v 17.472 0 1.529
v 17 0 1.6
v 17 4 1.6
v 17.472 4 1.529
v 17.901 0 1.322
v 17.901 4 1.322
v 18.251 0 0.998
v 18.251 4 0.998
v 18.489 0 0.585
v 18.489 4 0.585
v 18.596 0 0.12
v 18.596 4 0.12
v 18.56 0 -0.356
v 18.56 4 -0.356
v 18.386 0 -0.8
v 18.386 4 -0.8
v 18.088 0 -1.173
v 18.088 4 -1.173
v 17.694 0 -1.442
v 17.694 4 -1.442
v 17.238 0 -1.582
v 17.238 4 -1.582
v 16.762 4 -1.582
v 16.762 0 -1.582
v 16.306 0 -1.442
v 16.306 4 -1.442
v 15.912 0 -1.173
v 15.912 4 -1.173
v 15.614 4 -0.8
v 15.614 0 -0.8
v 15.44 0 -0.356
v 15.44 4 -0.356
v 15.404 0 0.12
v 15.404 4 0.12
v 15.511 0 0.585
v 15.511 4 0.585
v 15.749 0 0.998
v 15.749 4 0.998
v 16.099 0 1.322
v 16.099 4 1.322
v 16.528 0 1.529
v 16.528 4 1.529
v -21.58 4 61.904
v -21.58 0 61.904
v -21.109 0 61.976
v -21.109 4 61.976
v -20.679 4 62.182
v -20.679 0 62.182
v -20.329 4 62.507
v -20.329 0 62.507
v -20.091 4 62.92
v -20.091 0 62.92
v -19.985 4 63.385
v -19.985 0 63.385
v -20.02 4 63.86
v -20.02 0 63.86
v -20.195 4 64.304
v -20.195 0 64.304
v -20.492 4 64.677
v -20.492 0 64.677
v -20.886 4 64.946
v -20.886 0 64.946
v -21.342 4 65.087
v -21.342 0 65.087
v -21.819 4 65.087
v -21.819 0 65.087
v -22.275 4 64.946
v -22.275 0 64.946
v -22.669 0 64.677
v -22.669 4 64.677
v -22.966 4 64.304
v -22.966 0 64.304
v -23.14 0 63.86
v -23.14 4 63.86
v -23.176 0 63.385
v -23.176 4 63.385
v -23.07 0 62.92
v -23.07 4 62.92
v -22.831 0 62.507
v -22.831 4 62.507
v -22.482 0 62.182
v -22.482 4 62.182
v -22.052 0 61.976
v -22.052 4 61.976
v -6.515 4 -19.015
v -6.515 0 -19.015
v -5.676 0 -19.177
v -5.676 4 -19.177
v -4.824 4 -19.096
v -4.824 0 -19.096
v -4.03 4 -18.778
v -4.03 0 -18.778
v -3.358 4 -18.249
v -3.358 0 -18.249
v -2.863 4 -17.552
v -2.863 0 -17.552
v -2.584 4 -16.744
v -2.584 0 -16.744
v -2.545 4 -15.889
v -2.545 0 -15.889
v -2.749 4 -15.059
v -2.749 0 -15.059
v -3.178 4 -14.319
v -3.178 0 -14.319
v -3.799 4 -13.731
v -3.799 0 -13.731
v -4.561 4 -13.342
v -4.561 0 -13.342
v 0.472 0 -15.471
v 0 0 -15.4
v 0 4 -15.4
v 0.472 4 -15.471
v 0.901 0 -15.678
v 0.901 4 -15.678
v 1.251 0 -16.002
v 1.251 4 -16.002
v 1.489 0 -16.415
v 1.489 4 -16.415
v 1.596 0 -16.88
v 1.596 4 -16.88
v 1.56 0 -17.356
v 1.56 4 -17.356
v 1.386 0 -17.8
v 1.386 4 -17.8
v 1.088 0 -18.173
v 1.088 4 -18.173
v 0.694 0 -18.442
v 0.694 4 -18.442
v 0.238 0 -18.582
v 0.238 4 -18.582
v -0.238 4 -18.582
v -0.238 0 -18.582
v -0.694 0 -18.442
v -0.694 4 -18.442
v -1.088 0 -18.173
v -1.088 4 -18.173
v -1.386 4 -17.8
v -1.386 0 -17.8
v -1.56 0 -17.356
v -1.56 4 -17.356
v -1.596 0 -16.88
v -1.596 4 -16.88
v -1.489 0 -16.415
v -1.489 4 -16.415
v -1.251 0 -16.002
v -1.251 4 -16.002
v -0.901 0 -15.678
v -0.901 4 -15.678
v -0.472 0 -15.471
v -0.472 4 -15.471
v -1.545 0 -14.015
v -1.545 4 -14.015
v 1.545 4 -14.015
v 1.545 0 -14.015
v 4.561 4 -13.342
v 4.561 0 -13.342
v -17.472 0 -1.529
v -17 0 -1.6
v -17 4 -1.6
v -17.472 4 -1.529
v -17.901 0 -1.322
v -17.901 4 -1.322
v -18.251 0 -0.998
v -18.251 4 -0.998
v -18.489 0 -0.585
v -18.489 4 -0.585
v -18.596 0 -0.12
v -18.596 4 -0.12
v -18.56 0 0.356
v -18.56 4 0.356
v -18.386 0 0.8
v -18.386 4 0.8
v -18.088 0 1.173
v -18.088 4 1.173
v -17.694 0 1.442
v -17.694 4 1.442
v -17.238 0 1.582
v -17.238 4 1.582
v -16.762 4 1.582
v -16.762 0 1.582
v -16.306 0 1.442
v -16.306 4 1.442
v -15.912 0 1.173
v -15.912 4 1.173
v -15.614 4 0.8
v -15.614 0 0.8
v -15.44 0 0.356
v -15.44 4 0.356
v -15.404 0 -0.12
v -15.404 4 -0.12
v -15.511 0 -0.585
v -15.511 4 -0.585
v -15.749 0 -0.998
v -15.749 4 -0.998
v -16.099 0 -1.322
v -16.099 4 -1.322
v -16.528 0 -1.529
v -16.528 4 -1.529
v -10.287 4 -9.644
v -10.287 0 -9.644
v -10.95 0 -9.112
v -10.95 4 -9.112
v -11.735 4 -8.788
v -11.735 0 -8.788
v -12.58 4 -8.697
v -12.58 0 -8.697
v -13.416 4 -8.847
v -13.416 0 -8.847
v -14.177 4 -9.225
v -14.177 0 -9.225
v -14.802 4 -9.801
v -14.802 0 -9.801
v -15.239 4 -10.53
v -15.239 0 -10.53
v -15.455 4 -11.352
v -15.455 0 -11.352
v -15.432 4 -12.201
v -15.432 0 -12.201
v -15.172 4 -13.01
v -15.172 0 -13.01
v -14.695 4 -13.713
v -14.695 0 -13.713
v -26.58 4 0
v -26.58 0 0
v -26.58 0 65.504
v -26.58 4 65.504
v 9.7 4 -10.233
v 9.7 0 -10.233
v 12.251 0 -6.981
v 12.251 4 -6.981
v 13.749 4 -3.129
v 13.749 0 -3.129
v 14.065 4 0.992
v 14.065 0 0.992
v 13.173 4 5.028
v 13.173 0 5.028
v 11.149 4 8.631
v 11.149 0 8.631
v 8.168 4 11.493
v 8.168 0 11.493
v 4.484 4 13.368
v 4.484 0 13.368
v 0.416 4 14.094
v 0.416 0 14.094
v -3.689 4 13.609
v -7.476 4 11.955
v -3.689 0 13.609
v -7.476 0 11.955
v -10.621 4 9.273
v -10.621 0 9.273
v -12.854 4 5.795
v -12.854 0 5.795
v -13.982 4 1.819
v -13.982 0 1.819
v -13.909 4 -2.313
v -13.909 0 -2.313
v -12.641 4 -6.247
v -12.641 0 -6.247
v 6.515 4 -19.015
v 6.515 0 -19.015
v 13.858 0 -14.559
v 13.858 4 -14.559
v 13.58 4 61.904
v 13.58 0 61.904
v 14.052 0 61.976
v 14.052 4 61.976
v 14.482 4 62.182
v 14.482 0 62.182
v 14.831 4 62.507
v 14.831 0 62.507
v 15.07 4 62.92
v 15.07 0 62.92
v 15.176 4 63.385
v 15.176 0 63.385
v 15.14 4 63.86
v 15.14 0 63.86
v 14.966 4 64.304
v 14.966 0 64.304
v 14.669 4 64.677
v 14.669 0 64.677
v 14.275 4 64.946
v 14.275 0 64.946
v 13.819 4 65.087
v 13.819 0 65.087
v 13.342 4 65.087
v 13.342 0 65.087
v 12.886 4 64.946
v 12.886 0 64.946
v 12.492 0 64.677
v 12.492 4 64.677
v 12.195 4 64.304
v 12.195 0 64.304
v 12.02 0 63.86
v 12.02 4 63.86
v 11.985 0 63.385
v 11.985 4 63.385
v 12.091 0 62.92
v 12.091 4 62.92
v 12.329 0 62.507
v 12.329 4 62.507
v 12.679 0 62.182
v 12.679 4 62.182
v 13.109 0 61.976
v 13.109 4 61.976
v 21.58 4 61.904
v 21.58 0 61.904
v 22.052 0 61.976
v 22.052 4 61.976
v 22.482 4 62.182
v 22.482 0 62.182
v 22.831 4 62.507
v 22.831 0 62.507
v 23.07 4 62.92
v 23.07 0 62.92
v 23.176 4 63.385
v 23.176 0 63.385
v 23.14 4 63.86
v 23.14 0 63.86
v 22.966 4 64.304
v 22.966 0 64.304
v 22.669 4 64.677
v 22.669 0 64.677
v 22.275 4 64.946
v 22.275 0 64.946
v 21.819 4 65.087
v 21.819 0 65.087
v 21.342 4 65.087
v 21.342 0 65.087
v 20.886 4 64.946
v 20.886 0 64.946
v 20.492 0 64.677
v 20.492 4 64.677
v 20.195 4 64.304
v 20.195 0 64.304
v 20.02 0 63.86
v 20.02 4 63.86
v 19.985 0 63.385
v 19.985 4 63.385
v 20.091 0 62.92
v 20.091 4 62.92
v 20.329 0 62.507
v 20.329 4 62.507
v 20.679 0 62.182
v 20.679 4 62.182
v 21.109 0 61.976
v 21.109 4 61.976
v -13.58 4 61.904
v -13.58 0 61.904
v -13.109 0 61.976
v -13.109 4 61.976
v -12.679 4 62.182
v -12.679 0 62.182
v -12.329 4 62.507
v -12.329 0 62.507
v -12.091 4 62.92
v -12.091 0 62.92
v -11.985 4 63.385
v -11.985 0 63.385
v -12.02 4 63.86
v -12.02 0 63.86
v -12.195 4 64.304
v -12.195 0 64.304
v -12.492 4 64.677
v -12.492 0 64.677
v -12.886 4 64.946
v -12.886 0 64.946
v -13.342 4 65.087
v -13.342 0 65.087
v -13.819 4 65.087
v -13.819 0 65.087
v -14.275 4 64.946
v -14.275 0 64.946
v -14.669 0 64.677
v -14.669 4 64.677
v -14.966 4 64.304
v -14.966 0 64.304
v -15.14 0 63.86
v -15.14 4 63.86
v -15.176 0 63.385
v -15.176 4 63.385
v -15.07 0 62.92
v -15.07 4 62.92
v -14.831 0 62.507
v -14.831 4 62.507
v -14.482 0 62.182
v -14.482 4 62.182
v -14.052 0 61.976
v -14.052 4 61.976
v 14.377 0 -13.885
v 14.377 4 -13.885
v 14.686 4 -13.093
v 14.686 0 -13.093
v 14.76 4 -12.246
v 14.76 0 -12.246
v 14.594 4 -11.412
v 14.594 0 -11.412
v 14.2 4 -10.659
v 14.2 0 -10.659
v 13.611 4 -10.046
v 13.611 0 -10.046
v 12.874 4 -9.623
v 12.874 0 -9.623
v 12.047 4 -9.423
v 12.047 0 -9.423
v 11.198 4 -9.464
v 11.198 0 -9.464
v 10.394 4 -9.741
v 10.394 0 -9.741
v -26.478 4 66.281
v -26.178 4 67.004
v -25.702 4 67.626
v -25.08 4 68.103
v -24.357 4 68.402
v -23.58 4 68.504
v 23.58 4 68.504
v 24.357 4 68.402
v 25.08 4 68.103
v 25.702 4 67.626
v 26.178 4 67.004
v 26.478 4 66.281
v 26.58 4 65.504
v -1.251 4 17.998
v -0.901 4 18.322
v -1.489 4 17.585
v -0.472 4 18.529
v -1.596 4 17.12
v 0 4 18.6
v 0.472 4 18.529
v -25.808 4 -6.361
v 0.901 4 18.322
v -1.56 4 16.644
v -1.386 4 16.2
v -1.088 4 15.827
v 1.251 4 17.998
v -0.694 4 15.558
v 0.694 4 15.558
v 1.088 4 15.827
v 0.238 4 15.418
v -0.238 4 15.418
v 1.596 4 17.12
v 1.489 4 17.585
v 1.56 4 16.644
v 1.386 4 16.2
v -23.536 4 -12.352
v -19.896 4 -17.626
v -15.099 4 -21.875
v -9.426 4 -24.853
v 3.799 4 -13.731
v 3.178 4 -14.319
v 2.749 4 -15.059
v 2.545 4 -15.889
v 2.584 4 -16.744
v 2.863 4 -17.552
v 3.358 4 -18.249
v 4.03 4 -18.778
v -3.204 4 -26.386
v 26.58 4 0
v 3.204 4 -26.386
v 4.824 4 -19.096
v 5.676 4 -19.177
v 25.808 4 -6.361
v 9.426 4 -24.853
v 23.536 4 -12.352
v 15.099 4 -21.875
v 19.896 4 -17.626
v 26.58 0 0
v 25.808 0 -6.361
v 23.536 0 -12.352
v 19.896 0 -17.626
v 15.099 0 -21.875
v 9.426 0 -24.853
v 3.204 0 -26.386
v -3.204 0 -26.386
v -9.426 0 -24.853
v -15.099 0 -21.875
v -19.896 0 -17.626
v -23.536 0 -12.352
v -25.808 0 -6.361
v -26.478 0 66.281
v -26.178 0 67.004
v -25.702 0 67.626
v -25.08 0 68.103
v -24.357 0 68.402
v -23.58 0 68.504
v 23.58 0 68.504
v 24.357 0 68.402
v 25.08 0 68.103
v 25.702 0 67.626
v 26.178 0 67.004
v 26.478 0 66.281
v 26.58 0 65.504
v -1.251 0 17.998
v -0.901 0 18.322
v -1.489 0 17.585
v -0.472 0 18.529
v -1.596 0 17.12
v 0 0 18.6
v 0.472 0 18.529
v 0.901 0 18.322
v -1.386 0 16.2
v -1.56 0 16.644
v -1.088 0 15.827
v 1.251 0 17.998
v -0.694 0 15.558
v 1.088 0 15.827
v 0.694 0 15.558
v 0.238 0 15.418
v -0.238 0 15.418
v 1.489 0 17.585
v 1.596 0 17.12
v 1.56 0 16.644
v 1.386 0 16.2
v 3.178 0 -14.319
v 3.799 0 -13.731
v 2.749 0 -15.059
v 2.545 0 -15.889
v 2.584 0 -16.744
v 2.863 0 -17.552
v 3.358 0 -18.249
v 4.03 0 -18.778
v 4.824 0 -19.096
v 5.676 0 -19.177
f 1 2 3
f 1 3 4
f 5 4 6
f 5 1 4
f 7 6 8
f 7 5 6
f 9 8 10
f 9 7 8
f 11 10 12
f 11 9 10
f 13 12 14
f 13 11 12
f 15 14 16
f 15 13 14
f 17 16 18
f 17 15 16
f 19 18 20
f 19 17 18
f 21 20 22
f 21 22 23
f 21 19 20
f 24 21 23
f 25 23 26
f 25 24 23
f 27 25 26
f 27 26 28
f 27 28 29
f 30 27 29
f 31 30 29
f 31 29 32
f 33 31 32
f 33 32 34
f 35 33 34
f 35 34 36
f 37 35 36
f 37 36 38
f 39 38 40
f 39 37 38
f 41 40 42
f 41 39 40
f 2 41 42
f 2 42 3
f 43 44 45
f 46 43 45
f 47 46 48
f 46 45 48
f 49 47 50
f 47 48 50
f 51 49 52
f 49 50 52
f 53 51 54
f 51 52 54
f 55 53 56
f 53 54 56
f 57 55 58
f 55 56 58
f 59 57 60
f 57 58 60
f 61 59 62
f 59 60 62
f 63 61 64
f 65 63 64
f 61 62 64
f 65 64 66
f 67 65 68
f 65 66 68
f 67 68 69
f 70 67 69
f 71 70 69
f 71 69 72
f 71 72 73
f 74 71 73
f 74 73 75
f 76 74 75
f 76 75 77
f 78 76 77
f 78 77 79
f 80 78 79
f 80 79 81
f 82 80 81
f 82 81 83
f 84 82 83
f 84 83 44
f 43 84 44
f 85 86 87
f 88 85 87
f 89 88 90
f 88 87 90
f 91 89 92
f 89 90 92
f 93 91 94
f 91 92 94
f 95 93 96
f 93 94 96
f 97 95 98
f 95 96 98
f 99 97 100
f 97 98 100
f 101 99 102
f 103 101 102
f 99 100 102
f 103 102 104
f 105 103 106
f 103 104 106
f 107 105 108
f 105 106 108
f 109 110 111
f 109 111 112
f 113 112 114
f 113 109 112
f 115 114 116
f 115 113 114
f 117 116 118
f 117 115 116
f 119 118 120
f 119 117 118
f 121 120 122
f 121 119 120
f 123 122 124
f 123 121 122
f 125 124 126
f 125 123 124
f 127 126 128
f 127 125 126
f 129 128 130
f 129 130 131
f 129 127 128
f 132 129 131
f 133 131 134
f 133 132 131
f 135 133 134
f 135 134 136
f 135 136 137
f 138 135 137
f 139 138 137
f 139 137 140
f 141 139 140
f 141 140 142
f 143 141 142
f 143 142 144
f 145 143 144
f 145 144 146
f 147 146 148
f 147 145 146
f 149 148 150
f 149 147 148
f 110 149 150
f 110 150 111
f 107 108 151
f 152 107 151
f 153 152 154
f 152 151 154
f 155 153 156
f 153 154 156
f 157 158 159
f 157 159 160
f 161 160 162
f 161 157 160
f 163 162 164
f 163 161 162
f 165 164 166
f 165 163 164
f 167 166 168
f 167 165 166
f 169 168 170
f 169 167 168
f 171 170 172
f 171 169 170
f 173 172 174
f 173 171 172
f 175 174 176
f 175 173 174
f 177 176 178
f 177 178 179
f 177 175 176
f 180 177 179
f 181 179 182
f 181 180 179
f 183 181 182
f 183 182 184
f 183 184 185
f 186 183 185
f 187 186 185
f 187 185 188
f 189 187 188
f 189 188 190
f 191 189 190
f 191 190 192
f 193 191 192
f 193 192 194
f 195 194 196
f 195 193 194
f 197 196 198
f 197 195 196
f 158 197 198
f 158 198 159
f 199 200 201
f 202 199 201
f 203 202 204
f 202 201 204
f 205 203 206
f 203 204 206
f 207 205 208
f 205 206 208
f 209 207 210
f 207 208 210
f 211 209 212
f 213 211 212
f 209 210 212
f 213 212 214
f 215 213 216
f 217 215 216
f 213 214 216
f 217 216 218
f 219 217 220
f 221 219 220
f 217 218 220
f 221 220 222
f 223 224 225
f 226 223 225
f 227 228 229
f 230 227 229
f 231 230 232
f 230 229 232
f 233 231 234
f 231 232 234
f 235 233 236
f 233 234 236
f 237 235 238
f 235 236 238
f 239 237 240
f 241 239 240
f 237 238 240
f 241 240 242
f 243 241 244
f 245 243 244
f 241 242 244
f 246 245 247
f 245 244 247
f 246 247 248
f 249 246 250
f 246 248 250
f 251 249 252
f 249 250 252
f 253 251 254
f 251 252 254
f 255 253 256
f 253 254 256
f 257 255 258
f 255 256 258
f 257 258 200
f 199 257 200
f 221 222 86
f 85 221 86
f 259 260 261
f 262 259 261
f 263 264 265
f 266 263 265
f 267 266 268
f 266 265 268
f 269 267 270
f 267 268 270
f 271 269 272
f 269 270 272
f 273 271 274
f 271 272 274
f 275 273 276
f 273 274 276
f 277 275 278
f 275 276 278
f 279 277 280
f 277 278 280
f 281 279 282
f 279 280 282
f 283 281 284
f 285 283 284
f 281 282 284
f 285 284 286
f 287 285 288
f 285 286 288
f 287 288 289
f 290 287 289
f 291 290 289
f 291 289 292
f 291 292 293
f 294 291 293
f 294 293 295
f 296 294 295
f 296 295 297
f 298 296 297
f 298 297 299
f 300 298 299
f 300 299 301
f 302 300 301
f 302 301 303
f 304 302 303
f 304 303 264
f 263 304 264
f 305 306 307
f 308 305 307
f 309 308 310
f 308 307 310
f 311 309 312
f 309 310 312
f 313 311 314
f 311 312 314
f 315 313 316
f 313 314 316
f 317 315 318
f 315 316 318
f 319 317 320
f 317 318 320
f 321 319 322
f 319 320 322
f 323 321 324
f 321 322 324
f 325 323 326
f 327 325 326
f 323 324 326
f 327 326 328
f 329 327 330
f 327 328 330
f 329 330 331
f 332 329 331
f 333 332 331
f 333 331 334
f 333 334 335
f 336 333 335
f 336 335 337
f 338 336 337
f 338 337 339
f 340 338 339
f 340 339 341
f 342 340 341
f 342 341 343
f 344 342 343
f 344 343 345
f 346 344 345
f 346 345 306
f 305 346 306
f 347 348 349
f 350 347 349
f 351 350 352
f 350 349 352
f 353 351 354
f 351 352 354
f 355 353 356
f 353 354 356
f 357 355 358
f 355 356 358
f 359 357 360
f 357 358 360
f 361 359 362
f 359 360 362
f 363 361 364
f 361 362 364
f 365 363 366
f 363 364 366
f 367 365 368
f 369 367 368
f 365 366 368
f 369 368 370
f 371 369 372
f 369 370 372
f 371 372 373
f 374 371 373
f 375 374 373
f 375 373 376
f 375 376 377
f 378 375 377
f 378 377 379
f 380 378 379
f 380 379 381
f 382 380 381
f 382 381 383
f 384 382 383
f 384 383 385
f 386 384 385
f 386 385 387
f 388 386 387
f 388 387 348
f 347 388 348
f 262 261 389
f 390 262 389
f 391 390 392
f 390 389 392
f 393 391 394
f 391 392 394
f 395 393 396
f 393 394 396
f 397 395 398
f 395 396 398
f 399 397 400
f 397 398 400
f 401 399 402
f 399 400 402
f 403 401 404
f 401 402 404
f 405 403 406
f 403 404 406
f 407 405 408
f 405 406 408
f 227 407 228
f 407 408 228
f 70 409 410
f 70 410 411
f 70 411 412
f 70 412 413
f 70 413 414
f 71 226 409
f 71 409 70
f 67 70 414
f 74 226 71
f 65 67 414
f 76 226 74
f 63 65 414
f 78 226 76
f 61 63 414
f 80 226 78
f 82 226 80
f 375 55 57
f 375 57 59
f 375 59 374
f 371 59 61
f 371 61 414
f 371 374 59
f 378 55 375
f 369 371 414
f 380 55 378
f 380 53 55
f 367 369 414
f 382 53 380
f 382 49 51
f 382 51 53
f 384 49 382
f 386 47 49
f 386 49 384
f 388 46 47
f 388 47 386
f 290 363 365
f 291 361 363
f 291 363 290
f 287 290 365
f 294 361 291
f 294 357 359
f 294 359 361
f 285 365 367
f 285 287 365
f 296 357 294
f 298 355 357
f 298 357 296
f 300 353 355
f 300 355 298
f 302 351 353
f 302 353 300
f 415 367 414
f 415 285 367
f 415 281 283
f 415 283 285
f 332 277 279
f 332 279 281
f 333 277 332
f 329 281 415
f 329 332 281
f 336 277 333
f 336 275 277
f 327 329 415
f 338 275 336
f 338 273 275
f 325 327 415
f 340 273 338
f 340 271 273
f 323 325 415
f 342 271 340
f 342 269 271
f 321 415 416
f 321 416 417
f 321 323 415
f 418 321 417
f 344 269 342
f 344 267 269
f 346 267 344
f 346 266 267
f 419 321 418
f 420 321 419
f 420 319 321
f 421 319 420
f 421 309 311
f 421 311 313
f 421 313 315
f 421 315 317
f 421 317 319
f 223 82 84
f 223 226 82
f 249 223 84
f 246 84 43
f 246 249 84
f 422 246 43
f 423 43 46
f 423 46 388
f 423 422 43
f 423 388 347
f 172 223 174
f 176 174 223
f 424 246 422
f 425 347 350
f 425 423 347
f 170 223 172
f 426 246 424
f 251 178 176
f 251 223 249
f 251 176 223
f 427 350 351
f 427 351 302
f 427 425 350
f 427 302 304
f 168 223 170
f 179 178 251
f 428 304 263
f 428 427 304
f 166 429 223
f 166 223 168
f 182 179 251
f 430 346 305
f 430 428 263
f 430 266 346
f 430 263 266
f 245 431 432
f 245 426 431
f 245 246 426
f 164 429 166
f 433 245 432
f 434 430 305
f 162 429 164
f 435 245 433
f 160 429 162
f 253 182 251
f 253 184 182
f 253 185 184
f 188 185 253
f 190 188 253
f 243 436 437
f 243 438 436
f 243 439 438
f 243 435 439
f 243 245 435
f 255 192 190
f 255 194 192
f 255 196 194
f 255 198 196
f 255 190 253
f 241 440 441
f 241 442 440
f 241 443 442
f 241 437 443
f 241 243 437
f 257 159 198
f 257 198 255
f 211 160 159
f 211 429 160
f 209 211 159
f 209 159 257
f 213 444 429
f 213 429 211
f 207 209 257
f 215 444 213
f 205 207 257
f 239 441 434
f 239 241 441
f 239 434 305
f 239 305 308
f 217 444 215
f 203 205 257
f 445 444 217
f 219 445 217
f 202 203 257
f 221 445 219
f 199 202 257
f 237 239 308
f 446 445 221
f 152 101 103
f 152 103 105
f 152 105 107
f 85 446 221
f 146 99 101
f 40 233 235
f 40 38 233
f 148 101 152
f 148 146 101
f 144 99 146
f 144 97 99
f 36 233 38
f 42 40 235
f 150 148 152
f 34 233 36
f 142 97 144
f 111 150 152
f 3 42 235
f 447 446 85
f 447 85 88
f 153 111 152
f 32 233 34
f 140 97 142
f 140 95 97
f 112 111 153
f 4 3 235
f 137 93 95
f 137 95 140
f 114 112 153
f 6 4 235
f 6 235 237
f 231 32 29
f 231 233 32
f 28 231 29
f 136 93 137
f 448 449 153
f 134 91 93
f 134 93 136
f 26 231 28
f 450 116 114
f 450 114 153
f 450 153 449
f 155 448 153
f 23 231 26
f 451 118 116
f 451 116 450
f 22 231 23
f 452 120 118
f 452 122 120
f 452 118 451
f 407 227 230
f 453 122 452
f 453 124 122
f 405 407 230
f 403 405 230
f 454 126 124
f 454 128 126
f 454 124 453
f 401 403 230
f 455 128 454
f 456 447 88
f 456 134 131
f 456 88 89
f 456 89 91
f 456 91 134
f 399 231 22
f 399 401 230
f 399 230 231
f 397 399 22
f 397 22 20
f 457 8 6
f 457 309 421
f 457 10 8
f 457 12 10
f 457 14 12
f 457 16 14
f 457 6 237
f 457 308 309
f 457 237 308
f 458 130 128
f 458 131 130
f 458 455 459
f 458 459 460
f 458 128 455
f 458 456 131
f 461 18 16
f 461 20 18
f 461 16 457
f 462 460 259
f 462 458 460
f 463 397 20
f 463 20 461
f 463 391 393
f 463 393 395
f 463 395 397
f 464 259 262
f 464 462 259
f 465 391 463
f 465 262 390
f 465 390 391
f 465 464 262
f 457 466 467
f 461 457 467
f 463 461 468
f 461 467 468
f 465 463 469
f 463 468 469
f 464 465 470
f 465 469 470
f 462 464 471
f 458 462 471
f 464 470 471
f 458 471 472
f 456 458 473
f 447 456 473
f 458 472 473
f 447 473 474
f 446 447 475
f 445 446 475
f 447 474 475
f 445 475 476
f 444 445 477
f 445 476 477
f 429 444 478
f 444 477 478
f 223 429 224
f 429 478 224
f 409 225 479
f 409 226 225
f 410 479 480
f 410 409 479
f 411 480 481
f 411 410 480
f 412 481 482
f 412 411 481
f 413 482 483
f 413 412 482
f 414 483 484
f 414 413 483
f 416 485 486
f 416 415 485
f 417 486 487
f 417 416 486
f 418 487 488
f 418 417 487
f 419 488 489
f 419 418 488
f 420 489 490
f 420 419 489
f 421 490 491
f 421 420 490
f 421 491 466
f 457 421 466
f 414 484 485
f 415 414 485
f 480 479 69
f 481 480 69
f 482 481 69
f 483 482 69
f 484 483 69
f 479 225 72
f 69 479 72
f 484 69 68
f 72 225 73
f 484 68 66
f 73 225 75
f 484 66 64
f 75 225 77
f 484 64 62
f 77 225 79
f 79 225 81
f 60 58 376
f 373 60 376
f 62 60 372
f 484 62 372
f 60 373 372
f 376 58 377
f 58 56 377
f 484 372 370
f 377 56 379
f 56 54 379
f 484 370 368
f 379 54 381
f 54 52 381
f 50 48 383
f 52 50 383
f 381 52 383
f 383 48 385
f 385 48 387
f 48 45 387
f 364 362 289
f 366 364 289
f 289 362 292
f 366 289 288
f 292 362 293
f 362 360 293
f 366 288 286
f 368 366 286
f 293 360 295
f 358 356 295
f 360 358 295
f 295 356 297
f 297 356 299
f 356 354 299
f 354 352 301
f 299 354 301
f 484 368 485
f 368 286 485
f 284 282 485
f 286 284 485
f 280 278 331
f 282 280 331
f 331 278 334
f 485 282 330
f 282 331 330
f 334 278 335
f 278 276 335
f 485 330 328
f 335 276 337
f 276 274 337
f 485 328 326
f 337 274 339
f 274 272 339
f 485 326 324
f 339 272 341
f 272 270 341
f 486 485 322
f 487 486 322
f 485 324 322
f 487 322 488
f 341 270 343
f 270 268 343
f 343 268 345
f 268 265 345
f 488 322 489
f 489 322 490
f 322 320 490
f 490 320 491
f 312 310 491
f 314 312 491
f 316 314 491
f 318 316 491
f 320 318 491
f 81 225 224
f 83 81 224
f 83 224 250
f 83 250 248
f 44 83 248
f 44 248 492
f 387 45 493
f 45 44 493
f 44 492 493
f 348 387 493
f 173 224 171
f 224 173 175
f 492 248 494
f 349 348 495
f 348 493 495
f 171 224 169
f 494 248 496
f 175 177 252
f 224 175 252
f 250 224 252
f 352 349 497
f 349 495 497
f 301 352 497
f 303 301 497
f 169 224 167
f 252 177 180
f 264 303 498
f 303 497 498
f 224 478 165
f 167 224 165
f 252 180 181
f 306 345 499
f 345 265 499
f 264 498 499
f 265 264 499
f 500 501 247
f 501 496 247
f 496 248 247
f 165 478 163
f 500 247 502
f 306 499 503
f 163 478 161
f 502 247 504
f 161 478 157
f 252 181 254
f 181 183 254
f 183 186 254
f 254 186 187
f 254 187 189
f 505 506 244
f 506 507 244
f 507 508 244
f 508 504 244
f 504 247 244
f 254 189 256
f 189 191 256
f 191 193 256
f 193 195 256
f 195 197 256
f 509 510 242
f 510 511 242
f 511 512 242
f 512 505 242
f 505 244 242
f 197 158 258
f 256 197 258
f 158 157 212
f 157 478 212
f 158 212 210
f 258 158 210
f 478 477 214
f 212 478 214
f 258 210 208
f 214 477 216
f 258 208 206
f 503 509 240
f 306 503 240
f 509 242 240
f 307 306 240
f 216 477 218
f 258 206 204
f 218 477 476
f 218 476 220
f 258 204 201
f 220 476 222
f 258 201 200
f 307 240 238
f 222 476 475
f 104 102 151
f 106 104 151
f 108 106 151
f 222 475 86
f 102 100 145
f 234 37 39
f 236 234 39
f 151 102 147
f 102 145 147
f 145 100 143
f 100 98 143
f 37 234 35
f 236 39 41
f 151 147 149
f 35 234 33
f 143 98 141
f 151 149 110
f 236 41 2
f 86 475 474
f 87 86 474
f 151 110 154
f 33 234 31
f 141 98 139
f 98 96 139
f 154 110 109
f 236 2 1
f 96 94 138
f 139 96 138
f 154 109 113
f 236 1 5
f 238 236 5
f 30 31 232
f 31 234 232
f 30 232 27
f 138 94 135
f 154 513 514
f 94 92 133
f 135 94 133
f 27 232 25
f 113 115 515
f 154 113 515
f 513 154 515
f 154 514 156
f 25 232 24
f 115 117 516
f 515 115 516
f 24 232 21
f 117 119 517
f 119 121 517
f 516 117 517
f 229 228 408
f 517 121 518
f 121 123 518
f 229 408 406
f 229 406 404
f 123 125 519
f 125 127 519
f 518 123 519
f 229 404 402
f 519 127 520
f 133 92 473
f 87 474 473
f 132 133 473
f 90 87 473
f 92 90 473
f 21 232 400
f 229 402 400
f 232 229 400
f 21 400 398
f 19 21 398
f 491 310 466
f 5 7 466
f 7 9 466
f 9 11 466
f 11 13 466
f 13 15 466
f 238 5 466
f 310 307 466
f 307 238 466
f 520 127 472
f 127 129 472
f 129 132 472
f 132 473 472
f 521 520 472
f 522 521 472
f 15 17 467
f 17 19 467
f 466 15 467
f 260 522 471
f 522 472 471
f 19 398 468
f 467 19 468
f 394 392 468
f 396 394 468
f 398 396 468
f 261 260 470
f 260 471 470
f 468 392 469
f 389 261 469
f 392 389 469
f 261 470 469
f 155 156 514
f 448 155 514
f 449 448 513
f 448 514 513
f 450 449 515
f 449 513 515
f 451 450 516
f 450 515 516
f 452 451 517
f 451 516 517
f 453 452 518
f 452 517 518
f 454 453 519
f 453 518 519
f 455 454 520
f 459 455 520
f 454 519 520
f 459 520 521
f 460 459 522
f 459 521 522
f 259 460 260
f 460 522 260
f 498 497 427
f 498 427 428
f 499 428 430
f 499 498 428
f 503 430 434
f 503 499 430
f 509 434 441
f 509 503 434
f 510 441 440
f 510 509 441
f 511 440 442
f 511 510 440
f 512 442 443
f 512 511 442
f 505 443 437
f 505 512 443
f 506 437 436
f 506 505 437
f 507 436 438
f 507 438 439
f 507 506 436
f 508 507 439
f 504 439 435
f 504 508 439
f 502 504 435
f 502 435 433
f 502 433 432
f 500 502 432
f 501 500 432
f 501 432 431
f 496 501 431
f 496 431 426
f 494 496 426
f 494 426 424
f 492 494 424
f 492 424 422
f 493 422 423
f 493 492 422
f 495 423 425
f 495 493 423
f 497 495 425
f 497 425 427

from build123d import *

# Parameters (mm, degrees)
SKETCH_1_R          = 1.6
EXTRUDE_1_DEPTH     = 4
SKETCH_2_R          = 1.6
CUT_EXTRUDE_1_DEPTH = 10
FILLET_1_R          = 3


with BuildPart() as part:
    # 草图1 → 凸台-拉伸1 (new body)
    with BuildSketch(Plane(origin=(0, 0, 0), x_dir=(1, 0, 0), z_dir=(0, 1, 0))):
        with BuildLine():
            Line((-26.580295873, 0), (-26.580295873, -68.504426064))
            Line((-26.580295873, -68.504426064), (26.580295873, -68.504426064))
            Line((26.580295873, -68.504426064), (26.580295873, 0))
            ThreePointArc((26.580295873, 0), (0, 26.580295873), (-26.580295873, 0))
        make_face()
        with Locations(Location((17, 0, 0), (0, 0, 270))):
            Circle(SKETCH_1_R, mode=Mode.SUBTRACT)
        with Locations(Location((-17, 0, 0), (0, 0, 90))):
            Circle(SKETCH_1_R, mode=Mode.SUBTRACT)
        with Locations(Location((0, 17, 0), (0, 0, 270))):
            Circle(SKETCH_1_R, mode=Mode.SUBTRACT)
        with Locations(Location((0, -17, 0), (0, 0, 270))):
            Circle(SKETCH_1_R, mode=Mode.SUBTRACT)
        with BuildLine():
            Line((-14.695026261, 13.713220631), (-6.515150502, 19.014728906))
            ThreePointArc((-6.515150502, 19.014728906), (-2.694610628, 17.158059668), (-4.560612538, 13.342069303))
            ThreePointArc((-4.560612538, 13.342069303), (0, 14.1), (4.560612538, 13.342069303))
            ThreePointArc((4.560612538, 13.342069303), (2.694610628, 17.158059668), (6.515150502, 19.014728906))
            Line((6.515150502, 19.014728906), (13.857784146, 14.558867106))
            ThreePointArc((13.857784146, 14.558867106), (13.927445578, 10.331314347), (9.700465883, 10.232837419))
            ThreePointArc((9.700465883, 10.232837419), (0.41557213, -14.093874549), (-10.286539783, 9.643500365))
            ThreePointArc((-10.286539783, 9.643500365), (-14.510070274, 9.490986437), (-14.695026261, 13.713220631))
        make_face(mode=Mode.SUBTRACT)
    extrude(amount=EXTRUDE_1_DEPTH)

    # 草图2 → 切除-拉伸1 (cut)
    with BuildSketch(Plane.XZ):
        with Locations(Location((21.580295873, 63.504426064, 0), (0, 0, 270))):
            Circle(SKETCH_2_R)
        with Locations(Location((13.580295873, 63.504426064, 0), (0, 0, 270))):
            Circle(SKETCH_2_R)
        with Locations(Location((-13.580295873, 63.504426064, 0), (0, 0, 270))):
            Circle(SKETCH_2_R)
        with Locations(Location((-21.580295873, 63.504426064, 0), (0, 0, 270))):
            Circle(SKETCH_2_R)
    extrude(amount=-CUT_EXTRUDE_1_DEPTH, mode=Mode.SUBTRACT)

    # 圆角1
    fillet_1_edges = [part.edges().sort_by_distance(p)[0] for p in [
        (-26.580295873, 2, 68.504426064),
        (26.580295873, 2, 68.504426064),
    ]]
    fillet(fillet_1_edges, radius=FILLET_1_R)


solid = part.part
